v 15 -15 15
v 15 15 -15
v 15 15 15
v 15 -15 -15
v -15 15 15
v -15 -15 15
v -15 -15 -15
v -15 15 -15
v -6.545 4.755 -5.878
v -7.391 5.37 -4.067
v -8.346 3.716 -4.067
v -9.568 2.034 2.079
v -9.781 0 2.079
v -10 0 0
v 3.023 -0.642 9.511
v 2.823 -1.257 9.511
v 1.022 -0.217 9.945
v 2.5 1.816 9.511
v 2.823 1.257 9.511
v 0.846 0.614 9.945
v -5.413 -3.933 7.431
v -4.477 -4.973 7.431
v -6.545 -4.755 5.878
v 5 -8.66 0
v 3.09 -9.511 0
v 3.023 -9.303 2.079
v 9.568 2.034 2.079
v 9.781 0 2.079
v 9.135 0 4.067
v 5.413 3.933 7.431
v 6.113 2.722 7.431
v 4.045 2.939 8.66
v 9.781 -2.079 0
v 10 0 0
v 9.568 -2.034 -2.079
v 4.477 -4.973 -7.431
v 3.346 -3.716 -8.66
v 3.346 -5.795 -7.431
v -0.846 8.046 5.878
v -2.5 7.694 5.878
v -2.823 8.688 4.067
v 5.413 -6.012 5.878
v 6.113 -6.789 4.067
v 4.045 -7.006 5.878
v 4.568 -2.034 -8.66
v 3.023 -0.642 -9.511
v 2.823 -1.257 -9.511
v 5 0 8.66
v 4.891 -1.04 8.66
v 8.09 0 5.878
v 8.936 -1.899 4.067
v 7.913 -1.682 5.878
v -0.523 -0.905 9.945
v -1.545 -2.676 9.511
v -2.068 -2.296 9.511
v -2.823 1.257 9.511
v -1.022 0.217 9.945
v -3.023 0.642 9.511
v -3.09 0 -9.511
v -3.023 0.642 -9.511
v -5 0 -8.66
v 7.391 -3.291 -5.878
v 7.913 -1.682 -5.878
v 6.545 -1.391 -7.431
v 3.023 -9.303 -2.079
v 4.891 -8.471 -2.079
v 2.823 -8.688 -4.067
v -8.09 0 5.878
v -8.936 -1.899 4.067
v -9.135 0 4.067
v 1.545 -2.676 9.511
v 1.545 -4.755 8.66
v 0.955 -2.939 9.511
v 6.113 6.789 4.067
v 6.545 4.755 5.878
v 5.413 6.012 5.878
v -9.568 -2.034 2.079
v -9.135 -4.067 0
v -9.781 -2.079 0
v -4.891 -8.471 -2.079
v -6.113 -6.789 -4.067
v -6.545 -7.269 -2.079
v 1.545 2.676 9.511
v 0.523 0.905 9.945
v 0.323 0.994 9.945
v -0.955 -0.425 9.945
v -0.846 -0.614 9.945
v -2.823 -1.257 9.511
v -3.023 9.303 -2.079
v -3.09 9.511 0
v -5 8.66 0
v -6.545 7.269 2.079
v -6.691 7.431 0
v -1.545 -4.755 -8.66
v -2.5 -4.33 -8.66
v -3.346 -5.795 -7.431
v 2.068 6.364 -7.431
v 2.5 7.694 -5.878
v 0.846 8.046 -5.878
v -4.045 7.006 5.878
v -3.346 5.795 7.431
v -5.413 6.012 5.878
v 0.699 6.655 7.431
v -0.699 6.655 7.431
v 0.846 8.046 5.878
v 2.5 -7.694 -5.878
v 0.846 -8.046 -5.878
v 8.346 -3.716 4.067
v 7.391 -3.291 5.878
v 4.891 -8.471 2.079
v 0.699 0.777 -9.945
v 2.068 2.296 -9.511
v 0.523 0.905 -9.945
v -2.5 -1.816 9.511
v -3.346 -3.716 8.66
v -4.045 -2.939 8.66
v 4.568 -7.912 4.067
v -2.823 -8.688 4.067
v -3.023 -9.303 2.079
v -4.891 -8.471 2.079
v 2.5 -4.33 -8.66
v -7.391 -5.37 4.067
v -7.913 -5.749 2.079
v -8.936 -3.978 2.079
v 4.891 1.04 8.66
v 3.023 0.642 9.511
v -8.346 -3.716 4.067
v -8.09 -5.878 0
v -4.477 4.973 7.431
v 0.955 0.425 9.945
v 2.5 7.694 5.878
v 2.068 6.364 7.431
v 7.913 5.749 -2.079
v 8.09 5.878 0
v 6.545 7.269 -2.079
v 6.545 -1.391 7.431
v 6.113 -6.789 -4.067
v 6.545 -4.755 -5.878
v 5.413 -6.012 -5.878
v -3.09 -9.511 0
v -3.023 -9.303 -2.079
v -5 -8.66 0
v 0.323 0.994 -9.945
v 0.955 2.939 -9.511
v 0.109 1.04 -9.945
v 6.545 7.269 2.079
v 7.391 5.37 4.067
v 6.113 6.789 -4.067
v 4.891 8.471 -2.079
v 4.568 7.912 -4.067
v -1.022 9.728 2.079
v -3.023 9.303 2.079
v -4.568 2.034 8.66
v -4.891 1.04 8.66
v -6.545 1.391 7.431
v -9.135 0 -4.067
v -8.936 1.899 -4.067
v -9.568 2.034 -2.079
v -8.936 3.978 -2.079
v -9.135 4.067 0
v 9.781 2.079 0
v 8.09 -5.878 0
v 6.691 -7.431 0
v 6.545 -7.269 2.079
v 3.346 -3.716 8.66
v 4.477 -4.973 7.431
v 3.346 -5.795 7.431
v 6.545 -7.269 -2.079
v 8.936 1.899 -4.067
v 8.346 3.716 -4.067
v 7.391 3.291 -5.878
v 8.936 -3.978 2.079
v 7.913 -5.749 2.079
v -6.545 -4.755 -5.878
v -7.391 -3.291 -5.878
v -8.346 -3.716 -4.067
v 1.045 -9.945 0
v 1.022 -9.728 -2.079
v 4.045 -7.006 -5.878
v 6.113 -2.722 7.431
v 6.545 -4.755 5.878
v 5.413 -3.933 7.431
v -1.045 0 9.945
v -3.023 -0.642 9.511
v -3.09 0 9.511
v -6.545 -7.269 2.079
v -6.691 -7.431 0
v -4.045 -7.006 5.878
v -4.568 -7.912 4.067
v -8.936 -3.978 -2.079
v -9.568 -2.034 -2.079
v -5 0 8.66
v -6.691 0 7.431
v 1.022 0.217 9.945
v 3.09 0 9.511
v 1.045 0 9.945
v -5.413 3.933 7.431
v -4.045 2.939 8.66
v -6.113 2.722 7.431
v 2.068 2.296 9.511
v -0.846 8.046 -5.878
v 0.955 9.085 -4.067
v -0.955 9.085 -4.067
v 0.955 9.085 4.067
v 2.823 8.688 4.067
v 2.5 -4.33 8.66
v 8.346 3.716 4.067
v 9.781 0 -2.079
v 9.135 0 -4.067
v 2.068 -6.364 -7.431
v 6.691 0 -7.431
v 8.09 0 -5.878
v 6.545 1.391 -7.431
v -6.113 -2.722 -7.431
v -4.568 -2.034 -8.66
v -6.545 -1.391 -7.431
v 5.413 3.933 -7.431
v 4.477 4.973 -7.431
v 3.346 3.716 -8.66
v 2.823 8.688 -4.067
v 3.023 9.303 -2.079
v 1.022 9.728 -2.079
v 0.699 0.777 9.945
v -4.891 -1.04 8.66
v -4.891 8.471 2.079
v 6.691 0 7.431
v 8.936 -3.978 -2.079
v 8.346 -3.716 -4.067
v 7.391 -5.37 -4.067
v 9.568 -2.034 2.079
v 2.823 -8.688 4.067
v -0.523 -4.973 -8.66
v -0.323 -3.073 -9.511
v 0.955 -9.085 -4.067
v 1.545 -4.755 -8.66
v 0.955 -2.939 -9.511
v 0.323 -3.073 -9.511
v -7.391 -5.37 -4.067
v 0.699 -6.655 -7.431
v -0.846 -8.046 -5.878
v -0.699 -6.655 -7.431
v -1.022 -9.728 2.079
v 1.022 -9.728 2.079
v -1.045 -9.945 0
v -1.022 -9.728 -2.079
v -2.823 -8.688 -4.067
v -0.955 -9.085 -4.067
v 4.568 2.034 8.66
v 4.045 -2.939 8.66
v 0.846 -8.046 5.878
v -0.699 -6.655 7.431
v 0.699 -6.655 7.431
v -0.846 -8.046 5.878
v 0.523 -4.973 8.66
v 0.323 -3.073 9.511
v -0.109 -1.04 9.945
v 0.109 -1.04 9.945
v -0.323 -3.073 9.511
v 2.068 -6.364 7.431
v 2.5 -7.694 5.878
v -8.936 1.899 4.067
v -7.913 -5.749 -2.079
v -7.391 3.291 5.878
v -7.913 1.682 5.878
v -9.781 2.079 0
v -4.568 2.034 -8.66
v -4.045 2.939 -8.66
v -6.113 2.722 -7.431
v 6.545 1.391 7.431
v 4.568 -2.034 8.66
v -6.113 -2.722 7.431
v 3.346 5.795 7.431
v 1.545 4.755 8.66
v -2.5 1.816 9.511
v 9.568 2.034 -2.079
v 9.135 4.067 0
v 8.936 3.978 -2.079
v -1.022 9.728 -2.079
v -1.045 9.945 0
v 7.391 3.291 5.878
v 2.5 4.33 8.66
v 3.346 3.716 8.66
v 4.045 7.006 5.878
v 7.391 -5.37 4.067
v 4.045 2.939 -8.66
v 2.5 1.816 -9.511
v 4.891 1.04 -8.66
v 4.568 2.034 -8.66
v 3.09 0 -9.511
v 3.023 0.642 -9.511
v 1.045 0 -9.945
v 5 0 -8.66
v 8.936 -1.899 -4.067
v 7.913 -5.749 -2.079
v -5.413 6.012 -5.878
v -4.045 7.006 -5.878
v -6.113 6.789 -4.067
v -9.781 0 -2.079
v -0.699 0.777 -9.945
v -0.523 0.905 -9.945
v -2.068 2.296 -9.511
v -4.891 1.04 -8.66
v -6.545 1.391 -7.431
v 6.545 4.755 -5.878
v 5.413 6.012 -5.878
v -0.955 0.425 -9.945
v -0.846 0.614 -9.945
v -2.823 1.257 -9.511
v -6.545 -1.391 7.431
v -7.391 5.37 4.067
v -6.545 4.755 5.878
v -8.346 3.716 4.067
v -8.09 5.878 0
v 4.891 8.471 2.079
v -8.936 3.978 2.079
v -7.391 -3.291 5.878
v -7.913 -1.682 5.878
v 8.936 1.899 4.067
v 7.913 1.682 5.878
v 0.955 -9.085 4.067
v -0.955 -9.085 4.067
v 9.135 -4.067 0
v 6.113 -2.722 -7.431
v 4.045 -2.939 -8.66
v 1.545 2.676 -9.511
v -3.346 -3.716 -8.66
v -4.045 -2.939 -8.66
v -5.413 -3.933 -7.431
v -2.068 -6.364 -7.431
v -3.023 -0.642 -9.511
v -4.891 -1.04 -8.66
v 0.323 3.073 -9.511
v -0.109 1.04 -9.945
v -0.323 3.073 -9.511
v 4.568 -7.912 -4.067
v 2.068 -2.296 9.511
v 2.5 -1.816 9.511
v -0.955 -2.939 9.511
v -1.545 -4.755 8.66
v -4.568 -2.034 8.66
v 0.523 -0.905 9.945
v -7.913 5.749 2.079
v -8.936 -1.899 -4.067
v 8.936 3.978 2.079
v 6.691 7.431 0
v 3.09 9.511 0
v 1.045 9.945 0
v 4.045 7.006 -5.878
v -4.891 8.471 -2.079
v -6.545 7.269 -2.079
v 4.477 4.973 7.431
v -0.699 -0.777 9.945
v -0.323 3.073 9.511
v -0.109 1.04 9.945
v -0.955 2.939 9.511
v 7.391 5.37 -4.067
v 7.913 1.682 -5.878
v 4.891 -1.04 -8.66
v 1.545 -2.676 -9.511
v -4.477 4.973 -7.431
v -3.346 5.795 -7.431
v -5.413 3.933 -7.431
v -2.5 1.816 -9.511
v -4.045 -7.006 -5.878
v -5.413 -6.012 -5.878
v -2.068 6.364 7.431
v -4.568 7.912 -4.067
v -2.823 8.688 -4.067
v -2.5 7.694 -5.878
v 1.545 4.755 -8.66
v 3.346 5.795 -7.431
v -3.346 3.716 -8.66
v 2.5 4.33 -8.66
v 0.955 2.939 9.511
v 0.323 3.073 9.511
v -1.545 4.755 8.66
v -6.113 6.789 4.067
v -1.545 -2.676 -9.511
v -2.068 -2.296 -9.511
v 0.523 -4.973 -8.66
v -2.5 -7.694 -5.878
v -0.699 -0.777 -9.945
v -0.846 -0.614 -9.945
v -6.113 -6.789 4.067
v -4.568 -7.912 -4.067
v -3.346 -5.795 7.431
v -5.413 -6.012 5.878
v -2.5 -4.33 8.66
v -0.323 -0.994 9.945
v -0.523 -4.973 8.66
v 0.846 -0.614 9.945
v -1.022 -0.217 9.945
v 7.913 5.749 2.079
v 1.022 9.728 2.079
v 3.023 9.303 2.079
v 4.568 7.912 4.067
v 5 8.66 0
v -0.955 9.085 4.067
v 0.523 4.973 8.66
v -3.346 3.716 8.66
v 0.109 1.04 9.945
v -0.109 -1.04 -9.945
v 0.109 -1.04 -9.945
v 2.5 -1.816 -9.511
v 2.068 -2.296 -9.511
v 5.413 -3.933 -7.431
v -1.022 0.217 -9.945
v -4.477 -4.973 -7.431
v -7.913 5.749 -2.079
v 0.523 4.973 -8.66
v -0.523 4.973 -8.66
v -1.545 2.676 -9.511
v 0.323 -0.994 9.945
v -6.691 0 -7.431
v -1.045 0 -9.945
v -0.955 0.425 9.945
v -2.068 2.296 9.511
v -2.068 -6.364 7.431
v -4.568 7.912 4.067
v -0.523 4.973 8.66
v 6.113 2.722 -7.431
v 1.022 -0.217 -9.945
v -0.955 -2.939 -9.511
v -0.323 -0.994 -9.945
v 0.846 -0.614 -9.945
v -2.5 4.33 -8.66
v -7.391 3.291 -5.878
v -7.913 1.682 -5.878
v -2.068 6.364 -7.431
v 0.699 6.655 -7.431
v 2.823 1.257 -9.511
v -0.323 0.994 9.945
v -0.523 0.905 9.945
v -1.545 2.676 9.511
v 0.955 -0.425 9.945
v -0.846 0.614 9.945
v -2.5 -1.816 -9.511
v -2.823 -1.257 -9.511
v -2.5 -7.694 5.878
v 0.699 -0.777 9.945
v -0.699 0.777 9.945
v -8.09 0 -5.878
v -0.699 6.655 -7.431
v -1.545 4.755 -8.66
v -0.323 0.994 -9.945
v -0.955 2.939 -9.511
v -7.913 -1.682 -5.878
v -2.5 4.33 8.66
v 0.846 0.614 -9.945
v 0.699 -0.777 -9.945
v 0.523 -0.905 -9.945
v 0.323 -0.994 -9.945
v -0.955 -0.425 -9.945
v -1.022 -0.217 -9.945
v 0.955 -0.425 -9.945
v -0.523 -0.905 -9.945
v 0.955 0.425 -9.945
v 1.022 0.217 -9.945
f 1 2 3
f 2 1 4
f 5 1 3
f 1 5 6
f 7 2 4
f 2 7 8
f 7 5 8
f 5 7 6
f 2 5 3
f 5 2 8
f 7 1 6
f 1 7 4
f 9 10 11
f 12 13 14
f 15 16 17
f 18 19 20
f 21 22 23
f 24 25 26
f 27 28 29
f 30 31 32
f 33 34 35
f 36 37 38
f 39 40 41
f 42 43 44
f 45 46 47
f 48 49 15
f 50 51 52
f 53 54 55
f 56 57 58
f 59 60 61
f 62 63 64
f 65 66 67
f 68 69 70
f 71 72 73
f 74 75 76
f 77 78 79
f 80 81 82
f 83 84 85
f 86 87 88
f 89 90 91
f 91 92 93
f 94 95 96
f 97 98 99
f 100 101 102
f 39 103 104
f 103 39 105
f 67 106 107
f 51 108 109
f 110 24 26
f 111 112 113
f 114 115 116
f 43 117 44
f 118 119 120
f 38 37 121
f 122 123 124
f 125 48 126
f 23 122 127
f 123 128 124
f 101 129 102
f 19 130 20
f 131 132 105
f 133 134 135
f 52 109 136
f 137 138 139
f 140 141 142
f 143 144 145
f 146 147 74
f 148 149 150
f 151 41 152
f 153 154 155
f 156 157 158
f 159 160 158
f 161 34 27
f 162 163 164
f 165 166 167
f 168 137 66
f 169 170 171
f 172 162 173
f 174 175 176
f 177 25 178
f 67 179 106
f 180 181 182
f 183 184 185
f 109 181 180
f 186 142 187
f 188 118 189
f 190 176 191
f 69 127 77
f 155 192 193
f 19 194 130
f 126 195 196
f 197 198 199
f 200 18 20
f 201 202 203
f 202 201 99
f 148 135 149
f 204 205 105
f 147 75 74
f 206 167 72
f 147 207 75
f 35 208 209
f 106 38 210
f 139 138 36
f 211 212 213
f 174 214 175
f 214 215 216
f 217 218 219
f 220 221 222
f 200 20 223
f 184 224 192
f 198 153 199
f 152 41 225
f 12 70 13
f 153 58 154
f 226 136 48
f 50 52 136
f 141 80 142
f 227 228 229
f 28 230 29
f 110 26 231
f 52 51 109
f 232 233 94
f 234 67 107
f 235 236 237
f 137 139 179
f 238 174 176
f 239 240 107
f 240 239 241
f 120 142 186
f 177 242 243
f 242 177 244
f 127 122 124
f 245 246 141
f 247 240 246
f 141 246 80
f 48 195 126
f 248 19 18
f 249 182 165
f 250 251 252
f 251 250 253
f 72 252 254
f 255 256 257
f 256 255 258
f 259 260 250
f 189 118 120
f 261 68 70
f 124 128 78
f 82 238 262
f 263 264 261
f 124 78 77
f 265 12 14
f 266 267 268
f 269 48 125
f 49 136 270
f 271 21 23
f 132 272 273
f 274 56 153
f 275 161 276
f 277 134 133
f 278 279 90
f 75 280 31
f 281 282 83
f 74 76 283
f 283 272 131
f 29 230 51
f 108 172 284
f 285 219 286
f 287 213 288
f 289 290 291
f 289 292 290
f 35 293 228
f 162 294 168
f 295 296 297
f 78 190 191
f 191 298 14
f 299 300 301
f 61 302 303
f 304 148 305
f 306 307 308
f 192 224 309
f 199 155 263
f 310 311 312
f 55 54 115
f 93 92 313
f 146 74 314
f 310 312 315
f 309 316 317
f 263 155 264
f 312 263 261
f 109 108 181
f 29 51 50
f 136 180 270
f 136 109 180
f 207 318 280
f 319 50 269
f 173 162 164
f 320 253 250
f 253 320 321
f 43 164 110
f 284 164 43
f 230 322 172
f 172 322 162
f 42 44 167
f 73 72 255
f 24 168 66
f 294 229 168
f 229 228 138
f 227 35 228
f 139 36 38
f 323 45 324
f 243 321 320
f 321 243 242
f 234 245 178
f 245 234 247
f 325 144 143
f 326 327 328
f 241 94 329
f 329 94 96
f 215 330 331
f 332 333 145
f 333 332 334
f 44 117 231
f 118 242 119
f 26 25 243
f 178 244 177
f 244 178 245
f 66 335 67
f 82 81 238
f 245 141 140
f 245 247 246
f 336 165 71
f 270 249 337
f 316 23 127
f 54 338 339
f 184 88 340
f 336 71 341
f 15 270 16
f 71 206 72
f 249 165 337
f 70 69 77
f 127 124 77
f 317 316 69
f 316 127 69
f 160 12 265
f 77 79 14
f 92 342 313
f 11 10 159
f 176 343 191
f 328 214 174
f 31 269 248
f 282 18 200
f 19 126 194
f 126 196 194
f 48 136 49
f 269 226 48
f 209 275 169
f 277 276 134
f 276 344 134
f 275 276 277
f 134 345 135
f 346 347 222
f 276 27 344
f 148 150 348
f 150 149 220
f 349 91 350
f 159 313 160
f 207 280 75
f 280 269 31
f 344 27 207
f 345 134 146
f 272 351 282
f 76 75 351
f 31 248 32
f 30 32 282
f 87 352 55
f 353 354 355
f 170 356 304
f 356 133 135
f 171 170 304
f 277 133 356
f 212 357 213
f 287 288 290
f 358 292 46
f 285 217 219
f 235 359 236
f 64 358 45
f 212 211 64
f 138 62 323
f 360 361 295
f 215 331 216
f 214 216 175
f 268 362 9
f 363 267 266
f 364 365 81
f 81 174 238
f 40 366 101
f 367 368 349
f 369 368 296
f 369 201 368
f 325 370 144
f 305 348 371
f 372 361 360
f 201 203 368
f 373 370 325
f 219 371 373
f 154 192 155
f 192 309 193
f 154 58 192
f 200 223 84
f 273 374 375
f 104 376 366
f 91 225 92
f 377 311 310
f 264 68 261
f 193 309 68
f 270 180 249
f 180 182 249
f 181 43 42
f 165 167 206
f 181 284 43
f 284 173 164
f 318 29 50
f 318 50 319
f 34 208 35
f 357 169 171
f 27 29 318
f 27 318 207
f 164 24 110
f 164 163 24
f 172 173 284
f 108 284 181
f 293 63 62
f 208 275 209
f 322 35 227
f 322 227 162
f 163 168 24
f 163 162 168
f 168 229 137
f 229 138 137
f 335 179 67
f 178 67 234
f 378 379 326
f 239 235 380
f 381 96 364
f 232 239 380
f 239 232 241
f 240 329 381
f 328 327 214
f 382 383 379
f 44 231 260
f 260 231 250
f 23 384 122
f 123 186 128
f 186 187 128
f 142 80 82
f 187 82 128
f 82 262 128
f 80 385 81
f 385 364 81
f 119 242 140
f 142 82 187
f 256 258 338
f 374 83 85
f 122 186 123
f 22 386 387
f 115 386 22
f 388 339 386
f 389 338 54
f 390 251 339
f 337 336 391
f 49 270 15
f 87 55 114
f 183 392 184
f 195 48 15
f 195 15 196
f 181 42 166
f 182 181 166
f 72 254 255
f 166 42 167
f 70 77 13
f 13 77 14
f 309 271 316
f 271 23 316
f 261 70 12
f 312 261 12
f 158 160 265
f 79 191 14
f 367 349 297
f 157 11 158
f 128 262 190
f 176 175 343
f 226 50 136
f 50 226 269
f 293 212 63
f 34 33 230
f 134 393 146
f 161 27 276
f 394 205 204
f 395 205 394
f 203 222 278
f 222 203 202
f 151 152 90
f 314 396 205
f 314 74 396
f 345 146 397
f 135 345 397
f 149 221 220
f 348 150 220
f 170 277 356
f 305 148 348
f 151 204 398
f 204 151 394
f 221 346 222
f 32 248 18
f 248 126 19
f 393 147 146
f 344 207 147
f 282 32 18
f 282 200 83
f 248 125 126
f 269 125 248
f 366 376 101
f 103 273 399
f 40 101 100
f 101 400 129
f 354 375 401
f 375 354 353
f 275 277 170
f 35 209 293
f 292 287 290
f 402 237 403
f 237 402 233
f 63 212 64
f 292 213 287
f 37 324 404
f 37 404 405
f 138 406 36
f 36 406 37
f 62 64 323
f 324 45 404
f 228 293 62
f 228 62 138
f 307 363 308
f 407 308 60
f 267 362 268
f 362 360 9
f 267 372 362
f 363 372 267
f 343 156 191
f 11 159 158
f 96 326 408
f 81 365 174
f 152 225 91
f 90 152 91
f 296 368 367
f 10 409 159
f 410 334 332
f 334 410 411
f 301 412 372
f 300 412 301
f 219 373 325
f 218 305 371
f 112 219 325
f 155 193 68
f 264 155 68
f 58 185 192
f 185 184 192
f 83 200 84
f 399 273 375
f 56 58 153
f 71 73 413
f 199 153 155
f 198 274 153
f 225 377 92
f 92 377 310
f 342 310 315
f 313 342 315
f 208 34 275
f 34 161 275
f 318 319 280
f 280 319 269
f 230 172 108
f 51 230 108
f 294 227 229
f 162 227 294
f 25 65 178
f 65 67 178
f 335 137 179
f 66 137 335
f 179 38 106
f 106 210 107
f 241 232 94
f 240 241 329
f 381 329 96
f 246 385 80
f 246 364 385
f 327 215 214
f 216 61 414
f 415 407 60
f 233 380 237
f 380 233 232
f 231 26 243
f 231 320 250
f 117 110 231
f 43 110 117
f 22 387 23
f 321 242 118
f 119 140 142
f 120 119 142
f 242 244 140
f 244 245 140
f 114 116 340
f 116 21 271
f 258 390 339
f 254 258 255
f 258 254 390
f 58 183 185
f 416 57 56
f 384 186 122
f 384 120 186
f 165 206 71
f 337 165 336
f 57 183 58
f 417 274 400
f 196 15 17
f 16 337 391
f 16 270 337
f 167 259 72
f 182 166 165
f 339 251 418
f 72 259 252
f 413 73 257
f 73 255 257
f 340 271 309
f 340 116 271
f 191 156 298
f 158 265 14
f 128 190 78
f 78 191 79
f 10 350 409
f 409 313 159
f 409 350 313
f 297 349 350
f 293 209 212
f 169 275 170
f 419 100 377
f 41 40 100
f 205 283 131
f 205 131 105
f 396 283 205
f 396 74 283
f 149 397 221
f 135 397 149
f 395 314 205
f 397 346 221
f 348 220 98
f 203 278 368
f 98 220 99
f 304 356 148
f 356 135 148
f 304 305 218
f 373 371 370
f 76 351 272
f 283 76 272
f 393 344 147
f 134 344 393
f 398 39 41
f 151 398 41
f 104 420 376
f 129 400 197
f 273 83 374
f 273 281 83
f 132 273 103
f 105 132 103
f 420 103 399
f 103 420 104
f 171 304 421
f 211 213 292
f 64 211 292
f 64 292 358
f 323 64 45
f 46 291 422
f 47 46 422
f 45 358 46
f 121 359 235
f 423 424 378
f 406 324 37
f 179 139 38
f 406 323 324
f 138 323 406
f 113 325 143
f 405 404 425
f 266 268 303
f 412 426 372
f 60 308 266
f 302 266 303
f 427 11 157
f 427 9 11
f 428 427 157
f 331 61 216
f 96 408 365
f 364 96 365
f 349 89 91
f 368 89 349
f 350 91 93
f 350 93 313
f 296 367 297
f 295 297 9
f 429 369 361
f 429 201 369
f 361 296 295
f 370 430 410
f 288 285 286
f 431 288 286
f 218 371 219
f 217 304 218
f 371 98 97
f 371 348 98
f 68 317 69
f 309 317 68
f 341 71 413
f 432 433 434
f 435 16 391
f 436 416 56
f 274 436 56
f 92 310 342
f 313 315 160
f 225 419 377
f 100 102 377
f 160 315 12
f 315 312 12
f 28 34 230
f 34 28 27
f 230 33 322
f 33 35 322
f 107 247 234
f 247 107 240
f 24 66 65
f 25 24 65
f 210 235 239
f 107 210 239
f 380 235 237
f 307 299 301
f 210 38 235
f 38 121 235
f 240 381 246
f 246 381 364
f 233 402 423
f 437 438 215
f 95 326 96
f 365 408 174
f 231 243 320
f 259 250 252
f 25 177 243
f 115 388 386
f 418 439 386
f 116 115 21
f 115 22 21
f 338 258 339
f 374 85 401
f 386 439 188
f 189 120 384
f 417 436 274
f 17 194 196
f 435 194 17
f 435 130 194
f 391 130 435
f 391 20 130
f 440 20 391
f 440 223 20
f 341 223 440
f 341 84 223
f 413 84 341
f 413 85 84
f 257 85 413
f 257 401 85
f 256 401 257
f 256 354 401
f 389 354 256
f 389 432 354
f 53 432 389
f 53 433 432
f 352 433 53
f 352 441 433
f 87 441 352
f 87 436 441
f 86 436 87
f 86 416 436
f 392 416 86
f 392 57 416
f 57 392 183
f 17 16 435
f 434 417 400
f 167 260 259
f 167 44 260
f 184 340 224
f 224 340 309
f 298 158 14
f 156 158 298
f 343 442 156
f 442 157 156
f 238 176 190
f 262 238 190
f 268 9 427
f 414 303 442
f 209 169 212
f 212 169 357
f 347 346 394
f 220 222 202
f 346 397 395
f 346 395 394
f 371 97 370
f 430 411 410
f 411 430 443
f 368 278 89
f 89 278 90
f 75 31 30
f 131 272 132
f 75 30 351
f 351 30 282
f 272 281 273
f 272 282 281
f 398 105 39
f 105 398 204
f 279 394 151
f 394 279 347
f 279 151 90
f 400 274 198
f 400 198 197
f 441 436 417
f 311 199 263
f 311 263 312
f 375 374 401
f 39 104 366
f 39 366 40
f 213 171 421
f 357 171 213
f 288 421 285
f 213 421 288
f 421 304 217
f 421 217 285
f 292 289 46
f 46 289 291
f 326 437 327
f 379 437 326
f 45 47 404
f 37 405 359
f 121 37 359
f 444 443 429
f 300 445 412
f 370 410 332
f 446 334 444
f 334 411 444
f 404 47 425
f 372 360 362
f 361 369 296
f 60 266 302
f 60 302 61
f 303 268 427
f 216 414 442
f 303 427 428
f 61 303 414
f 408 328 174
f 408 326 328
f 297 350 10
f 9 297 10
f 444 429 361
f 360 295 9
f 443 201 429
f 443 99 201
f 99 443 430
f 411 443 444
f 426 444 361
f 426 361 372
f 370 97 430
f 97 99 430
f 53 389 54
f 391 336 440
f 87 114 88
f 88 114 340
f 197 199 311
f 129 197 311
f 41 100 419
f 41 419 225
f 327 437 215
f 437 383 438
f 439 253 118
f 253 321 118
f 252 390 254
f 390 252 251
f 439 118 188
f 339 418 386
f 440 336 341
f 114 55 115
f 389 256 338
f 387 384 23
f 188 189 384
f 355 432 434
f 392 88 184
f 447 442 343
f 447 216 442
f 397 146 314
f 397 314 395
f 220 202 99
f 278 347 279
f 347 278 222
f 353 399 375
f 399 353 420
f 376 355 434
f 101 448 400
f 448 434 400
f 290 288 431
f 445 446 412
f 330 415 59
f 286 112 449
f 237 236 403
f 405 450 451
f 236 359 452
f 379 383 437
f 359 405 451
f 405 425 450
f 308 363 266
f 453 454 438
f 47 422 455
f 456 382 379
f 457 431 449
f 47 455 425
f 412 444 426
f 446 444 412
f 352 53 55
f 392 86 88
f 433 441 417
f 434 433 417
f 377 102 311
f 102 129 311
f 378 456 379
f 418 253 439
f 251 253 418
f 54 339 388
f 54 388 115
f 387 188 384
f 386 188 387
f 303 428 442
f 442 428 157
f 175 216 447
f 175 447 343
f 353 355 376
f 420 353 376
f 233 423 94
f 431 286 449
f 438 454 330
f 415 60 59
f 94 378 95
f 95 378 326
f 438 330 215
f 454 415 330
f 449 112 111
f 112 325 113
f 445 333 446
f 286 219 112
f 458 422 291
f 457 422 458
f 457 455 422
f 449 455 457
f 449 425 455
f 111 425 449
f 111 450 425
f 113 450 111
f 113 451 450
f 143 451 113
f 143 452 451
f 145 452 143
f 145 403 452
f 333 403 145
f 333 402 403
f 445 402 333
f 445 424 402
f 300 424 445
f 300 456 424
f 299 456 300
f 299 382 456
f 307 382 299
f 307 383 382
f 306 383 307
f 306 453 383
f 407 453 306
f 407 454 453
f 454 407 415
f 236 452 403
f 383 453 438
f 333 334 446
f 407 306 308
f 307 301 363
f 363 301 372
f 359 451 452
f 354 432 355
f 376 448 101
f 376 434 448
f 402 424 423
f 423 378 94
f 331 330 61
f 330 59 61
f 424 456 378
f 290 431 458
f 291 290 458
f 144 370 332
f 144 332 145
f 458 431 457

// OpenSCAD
module example004()
{
	difference() {
		cube(30, center = true);
		sphere(10);
	}
}

example004();
